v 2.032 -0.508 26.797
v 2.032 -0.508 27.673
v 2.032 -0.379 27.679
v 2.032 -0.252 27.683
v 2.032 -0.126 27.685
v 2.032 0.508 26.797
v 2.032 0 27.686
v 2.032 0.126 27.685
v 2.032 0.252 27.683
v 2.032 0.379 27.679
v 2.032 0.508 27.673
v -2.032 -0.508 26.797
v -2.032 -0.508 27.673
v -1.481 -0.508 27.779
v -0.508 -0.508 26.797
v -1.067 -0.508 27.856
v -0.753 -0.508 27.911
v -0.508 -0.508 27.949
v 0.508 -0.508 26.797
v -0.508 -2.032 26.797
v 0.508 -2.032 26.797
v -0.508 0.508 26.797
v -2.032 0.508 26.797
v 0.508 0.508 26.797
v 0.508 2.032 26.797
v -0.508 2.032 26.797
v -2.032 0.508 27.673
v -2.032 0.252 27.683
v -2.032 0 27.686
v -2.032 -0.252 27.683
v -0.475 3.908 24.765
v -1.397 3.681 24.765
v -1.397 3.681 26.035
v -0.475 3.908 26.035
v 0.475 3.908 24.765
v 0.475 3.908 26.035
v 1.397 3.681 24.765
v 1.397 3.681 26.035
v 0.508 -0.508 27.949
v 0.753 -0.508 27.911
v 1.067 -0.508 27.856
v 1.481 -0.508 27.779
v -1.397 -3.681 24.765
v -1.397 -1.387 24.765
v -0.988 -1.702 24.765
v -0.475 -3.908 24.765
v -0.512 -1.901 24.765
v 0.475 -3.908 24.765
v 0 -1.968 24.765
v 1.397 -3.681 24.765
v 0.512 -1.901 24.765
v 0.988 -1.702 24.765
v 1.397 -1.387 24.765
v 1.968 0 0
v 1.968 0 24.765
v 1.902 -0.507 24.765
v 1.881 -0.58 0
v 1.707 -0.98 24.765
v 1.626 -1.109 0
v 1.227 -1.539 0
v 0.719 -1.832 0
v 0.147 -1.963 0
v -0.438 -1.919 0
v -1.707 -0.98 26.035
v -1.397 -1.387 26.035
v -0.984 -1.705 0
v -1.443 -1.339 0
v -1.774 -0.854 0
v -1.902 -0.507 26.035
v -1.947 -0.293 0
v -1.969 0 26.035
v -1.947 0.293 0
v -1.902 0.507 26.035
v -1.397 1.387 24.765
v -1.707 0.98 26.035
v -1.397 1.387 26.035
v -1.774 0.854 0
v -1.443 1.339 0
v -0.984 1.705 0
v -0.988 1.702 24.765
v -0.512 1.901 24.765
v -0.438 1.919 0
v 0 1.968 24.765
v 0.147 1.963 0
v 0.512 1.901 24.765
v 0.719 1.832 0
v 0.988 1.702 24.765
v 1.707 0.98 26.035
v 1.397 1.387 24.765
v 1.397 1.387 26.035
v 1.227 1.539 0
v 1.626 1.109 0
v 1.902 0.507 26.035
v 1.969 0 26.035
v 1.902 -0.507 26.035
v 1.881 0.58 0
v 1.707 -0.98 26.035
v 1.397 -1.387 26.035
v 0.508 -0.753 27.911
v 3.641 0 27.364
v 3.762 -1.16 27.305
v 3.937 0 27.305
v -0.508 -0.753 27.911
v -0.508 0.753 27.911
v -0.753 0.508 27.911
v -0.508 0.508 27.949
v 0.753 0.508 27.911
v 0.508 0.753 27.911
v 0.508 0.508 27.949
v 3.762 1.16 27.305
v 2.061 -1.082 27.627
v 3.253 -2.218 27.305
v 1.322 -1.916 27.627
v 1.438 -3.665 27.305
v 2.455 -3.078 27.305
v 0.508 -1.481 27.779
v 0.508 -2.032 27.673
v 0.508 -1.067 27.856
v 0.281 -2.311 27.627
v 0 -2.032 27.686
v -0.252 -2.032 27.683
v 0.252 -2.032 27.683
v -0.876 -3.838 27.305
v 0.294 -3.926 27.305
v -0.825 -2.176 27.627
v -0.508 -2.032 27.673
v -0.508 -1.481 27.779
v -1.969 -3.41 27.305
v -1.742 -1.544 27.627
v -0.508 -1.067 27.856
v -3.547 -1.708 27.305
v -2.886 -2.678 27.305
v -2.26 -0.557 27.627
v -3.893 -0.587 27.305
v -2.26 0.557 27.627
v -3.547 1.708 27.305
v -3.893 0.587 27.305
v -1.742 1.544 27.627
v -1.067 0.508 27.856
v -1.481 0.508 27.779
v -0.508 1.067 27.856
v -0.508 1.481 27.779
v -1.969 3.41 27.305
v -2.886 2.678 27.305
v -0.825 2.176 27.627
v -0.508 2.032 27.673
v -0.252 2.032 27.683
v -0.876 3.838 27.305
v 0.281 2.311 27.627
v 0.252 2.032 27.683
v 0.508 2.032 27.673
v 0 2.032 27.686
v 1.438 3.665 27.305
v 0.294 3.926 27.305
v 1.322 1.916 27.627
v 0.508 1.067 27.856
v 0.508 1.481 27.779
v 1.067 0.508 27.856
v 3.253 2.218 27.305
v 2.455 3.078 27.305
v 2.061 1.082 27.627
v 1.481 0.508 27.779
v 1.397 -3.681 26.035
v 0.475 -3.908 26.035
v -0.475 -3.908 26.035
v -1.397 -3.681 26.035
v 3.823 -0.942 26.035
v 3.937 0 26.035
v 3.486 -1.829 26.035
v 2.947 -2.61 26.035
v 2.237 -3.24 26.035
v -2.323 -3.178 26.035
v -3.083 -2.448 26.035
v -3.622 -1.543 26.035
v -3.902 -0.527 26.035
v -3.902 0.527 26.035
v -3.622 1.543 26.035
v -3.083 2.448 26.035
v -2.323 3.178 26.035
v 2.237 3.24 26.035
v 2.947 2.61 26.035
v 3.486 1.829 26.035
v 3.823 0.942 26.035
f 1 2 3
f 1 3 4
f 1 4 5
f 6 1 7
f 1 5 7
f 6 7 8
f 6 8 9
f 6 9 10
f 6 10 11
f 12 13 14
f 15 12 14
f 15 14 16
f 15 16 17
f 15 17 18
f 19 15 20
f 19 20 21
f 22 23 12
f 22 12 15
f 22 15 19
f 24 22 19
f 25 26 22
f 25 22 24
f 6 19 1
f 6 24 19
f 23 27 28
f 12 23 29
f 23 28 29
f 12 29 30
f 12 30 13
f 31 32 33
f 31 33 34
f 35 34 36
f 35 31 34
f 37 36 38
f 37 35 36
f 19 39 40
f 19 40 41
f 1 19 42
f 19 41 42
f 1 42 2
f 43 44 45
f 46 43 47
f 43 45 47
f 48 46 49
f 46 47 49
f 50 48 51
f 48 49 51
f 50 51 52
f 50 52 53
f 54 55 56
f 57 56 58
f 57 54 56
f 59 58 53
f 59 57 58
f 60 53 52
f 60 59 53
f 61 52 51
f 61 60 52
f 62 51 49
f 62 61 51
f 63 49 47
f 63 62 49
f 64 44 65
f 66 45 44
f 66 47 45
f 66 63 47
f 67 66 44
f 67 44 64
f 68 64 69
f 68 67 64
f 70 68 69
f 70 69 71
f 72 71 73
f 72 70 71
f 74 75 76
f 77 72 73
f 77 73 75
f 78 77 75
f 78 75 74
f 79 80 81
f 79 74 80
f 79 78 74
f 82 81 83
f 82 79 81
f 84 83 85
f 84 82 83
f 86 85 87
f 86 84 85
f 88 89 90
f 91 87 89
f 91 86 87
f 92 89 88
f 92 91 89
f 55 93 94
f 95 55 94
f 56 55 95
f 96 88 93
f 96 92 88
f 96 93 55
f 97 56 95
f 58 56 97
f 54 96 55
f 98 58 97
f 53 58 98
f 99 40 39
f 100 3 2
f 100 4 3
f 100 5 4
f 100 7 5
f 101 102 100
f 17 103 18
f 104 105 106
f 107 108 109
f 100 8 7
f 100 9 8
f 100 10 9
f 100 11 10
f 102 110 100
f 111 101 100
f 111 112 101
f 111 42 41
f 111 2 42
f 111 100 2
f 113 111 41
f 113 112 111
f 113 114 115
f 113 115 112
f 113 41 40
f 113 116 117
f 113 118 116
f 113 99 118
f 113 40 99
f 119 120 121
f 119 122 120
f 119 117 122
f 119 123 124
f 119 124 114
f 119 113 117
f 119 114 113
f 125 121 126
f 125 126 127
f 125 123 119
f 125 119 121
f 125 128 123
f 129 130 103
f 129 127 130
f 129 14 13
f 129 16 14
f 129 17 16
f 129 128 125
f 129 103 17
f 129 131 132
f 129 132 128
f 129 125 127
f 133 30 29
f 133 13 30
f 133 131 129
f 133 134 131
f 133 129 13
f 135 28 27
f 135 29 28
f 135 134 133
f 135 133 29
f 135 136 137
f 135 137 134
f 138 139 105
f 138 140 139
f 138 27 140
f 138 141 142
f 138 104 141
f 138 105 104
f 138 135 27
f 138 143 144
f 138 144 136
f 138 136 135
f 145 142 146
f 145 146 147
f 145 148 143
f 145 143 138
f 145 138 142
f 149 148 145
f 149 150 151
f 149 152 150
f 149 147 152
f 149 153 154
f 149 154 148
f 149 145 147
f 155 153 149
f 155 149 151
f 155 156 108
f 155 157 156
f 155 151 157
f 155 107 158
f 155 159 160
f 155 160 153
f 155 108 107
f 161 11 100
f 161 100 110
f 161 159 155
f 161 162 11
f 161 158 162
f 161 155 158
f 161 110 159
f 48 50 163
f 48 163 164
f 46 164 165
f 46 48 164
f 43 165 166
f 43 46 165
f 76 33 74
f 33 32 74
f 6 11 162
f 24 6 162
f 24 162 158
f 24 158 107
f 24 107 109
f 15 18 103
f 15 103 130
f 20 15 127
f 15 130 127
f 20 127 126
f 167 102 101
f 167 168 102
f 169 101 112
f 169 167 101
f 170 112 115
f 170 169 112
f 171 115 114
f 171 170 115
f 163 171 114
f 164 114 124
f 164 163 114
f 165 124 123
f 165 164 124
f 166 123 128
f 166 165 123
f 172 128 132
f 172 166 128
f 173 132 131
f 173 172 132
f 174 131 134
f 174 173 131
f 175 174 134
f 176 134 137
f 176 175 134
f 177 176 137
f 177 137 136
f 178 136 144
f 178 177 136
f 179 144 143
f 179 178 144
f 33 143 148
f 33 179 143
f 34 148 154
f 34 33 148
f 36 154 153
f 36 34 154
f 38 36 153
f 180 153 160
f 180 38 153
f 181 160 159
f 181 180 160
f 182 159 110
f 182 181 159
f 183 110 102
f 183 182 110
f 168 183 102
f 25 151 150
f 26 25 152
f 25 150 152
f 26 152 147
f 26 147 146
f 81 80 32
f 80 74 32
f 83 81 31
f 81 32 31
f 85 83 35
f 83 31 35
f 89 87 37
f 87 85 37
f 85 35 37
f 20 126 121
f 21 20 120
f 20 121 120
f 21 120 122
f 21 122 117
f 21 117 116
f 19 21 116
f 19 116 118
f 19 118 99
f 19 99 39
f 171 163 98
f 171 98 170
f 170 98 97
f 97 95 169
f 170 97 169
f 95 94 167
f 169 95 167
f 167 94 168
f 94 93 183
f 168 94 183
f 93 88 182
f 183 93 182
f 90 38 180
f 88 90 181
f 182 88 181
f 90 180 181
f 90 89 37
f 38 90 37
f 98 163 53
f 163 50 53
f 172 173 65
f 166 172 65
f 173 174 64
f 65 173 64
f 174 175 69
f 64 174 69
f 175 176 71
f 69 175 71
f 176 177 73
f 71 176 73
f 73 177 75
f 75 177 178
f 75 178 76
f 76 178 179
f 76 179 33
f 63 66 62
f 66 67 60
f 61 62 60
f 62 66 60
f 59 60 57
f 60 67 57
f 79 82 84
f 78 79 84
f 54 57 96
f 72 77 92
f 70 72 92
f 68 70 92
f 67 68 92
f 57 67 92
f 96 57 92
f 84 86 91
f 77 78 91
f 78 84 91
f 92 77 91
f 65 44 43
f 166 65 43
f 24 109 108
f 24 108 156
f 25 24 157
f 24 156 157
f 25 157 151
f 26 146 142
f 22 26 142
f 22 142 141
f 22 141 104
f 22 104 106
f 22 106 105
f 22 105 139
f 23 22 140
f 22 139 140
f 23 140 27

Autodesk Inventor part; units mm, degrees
ref_plane "YZ Plane" through (0, 0, 0) normal (1, 0, 0) x (0, 1, 0)
ref_plane "XZ Plane" through (0, 0, 0) normal (0, 1, 0) x (-1, 0, 0)
sketch "Sketch1" plane through (0, 0, 0) normal (0, 0, 1) x (1, 0, 0)
  circle A0 centre (0, 0) radius 1.9685
  dimension "d0" = 3.937
sketch "Sketch1 outline for Extrusion1" plane through (0, 0, 0) normal (0, 0, 1) x (1, 0, 0)
  circle A0 centre (0, 0) radius 1.9685
extrude "Extrusion1" add sketch "Sketch1 outline for Extrusion1" along normal blind 24.765
sketch "Sketch2" plane through (0, 0, 24.765) normal (0, 0, 1) x (1, 0, 0)
  circle A0 centre (0, 0) radius 1.9685
  line L0 (-1.397, 3.68081) -> (-1.397, 1.386861)
  line L1 (1.397, 3.68081) -> (1.397, 1.386861)
  line L2 (1.397, -3.68081) -> (1.397, -1.386861)
  line L3 (-1.397, -3.68081) -> (-1.397, -1.386861)
  arc A1 (1.397, 3.68081) -> (-1.397, 3.68081) centre (0, 0) ccw
  arc A2 (-1.397, -3.68081) -> (1.397, -3.68081) centre (0, 0) ccw
  arc A3 (-1.397, 1.386861) -> (-1.397, -1.386861) centre (0, 0) ccw
  arc A4 (1.397, -1.386861) -> (1.397, 1.386861) centre (0, 0) ccw
  point P0 (0, 1.9685)
  point P1 (0, -1.9685)
  point P2 (1.397, 1.9685)
  point P3 (-1.397, 1.9685)
  point P4 (1.397, -1.9685)
  point P5 (-1.397, -1.9685)
  dimension "d6" = 1.397
  dimension "d7" = 1.397
  dimension "d8" = 1.397
  dimension "d9" = 1.397
sketch "Sketch2 outline for Extrusion2" plane through (0, 0, 24.765) normal (0, 0, 1) x (1, 0, 0)
  arc A0 (1.397, 3.68081) -> (-1.397, 3.68081) centre (0, 0) ccw
  line L0 (-1.397, 3.68081) -> (-1.397, 1.386861)
  arc A1 (-1.397, 1.386861) -> (-1.397, -1.386861) centre (0, 0) ccw
  line L1 (-1.397, -1.386861) -> (-1.397, -3.68081)
  arc A2 (-1.397, -3.68081) -> (1.397, -3.68081) centre (0, 0) ccw
  line L2 (1.397, -3.68081) -> (1.397, -1.386861)
  arc A3 (1.397, -1.386861) -> (1.397, 1.386861) centre (0, 0) ccw
  line L3 (1.397, 1.386861) -> (1.397, 3.68081)
extrude "Extrusion2" add sketch "Sketch2 outline for Extrusion2" along normal blind 1.27
sketch "Sketch3" plane through (0, 0, 26.035) normal (0, 0, 1) x (1, 0, 0)
  arc A0 (1.397, 3.68081) -> (-1.397, 3.68081) centre (0, 0) ccw
  circle A1 centre (0, 0) radius 3.937
sketch "Sketch3 outline for Extrusion3" plane through (0, 0, 26.035) normal (0, 0, 1) x (1, 0, 0)
  circle A0 centre (0, 0) radius 3.937
extrude "Extrusion3" add sketch "Sketch3 outline for Extrusion3" along normal blind 1.27
ref_plane "Work Plane1" through (0, 0, 28.067) normal (0, 0, 1) x (1, 0, 0)
sketch "Sketch4" plane through (0, 0, 28.067) normal (0, 0, 1) x (1, 0, 0)
  circle A0 centre (0, 0) radius 0.127
  dimension "d15" = 0.254
sketch "Sketch4 outline for Loft1" plane through (0, 0, 28.067) normal (0, 0, 1) x (1, 0, 0)
  circle A0 centre (0, 0) radius 0.127
loft "Loft1" add profiles "Sketch4 outline for Loft1" section 2 edges at (-3.937, 0, 27.305)
sketch "Sketch5" plane through (0, 0, 28.067) normal (0, 0, 1) x (1, 0, 0)
  circle A0 centre (0, 0) radius 0.127 projected
  line L0 (-0.508, 2.032) -> (0.508, 2.032)
  line L1 (0.508, 2.032) -> (0.508, 0.508)
  line L2 (0.508, 0.508) -> (2.032, 0.508)
  line L3 (2.032, 0.508) -> (2.032, -0.508)
  line L4 (2.032, -0.508) -> (0.508, -0.508)
  line L5 (0.508, -0.508) -> (0.508, -2.032)
  line L6 (0.508, -2.032) -> (-0.508, -2.032)
  line L7 (-0.508, -2.032) -> (-0.508, -0.508)
  line L8 (-0.508, -0.508) -> (-2.032, -0.508)
  line L9 (-2.032, -0.508) -> (-2.032, 0.508)
  line L10 (-2.032, 0.508) -> (-0.508, 0.508)
  line L11 (-0.508, 0.508) -> (-0.508, 2.032)
  dimension "d22" = 0.508
  dimension "d23" = 0.508
  dimension "d24" = 0.508
  dimension "d25" = 0.508
  dimension "d26" = 2.032
  dimension "d27" = 2.032
  dimension "d28" = 2.032
  dimension "d29" = 2.032
  dimension "d30" = 2.032
  dimension "d31" = 2.032
  dimension "d32" = 2.032
  dimension "d33" = 2.032
sketch "Sketch5 outline for Extrusion4" plane through (0, 0, 28.067) normal (0, 0, 1) x (1, 0, 0)
  line L0 (2.032, 0.508) -> (0.508, 0.508)
  line L1 (2.032, -0.508) -> (2.032, 0.508)
  line L2 (0.508, -0.508) -> (2.032, -0.508)
  line L3 (0.508, -2.032) -> (0.508, -0.508)
  line L4 (-0.508, -2.032) -> (0.508, -2.032)
  line L5 (-0.508, -0.508) -> (-0.508, -2.032)
  line L6 (-2.032, -0.508) -> (-0.508, -0.508)
  line L7 (-2.032, 0.508) -> (-2.032, -0.508)
  line L8 (-0.508, 0.508) -> (-2.032, 0.508)
  line L9 (-0.508, 2.032) -> (-0.508, 0.508)
  line L10 (0.508, 2.032) -> (-0.508, 2.032)
  line L11 (0.508, 0.508) -> (0.508, 2.032)
extrude "Extrusion4" cut sketch "Sketch5 outline for Extrusion4" against normal blind 1.27
thread "Thread1" size "6-32 UNC" class "2A" standard "ANSI Unified Screw Threads" full length
properties part number "Prop Screw" material "Stainless Steel"
